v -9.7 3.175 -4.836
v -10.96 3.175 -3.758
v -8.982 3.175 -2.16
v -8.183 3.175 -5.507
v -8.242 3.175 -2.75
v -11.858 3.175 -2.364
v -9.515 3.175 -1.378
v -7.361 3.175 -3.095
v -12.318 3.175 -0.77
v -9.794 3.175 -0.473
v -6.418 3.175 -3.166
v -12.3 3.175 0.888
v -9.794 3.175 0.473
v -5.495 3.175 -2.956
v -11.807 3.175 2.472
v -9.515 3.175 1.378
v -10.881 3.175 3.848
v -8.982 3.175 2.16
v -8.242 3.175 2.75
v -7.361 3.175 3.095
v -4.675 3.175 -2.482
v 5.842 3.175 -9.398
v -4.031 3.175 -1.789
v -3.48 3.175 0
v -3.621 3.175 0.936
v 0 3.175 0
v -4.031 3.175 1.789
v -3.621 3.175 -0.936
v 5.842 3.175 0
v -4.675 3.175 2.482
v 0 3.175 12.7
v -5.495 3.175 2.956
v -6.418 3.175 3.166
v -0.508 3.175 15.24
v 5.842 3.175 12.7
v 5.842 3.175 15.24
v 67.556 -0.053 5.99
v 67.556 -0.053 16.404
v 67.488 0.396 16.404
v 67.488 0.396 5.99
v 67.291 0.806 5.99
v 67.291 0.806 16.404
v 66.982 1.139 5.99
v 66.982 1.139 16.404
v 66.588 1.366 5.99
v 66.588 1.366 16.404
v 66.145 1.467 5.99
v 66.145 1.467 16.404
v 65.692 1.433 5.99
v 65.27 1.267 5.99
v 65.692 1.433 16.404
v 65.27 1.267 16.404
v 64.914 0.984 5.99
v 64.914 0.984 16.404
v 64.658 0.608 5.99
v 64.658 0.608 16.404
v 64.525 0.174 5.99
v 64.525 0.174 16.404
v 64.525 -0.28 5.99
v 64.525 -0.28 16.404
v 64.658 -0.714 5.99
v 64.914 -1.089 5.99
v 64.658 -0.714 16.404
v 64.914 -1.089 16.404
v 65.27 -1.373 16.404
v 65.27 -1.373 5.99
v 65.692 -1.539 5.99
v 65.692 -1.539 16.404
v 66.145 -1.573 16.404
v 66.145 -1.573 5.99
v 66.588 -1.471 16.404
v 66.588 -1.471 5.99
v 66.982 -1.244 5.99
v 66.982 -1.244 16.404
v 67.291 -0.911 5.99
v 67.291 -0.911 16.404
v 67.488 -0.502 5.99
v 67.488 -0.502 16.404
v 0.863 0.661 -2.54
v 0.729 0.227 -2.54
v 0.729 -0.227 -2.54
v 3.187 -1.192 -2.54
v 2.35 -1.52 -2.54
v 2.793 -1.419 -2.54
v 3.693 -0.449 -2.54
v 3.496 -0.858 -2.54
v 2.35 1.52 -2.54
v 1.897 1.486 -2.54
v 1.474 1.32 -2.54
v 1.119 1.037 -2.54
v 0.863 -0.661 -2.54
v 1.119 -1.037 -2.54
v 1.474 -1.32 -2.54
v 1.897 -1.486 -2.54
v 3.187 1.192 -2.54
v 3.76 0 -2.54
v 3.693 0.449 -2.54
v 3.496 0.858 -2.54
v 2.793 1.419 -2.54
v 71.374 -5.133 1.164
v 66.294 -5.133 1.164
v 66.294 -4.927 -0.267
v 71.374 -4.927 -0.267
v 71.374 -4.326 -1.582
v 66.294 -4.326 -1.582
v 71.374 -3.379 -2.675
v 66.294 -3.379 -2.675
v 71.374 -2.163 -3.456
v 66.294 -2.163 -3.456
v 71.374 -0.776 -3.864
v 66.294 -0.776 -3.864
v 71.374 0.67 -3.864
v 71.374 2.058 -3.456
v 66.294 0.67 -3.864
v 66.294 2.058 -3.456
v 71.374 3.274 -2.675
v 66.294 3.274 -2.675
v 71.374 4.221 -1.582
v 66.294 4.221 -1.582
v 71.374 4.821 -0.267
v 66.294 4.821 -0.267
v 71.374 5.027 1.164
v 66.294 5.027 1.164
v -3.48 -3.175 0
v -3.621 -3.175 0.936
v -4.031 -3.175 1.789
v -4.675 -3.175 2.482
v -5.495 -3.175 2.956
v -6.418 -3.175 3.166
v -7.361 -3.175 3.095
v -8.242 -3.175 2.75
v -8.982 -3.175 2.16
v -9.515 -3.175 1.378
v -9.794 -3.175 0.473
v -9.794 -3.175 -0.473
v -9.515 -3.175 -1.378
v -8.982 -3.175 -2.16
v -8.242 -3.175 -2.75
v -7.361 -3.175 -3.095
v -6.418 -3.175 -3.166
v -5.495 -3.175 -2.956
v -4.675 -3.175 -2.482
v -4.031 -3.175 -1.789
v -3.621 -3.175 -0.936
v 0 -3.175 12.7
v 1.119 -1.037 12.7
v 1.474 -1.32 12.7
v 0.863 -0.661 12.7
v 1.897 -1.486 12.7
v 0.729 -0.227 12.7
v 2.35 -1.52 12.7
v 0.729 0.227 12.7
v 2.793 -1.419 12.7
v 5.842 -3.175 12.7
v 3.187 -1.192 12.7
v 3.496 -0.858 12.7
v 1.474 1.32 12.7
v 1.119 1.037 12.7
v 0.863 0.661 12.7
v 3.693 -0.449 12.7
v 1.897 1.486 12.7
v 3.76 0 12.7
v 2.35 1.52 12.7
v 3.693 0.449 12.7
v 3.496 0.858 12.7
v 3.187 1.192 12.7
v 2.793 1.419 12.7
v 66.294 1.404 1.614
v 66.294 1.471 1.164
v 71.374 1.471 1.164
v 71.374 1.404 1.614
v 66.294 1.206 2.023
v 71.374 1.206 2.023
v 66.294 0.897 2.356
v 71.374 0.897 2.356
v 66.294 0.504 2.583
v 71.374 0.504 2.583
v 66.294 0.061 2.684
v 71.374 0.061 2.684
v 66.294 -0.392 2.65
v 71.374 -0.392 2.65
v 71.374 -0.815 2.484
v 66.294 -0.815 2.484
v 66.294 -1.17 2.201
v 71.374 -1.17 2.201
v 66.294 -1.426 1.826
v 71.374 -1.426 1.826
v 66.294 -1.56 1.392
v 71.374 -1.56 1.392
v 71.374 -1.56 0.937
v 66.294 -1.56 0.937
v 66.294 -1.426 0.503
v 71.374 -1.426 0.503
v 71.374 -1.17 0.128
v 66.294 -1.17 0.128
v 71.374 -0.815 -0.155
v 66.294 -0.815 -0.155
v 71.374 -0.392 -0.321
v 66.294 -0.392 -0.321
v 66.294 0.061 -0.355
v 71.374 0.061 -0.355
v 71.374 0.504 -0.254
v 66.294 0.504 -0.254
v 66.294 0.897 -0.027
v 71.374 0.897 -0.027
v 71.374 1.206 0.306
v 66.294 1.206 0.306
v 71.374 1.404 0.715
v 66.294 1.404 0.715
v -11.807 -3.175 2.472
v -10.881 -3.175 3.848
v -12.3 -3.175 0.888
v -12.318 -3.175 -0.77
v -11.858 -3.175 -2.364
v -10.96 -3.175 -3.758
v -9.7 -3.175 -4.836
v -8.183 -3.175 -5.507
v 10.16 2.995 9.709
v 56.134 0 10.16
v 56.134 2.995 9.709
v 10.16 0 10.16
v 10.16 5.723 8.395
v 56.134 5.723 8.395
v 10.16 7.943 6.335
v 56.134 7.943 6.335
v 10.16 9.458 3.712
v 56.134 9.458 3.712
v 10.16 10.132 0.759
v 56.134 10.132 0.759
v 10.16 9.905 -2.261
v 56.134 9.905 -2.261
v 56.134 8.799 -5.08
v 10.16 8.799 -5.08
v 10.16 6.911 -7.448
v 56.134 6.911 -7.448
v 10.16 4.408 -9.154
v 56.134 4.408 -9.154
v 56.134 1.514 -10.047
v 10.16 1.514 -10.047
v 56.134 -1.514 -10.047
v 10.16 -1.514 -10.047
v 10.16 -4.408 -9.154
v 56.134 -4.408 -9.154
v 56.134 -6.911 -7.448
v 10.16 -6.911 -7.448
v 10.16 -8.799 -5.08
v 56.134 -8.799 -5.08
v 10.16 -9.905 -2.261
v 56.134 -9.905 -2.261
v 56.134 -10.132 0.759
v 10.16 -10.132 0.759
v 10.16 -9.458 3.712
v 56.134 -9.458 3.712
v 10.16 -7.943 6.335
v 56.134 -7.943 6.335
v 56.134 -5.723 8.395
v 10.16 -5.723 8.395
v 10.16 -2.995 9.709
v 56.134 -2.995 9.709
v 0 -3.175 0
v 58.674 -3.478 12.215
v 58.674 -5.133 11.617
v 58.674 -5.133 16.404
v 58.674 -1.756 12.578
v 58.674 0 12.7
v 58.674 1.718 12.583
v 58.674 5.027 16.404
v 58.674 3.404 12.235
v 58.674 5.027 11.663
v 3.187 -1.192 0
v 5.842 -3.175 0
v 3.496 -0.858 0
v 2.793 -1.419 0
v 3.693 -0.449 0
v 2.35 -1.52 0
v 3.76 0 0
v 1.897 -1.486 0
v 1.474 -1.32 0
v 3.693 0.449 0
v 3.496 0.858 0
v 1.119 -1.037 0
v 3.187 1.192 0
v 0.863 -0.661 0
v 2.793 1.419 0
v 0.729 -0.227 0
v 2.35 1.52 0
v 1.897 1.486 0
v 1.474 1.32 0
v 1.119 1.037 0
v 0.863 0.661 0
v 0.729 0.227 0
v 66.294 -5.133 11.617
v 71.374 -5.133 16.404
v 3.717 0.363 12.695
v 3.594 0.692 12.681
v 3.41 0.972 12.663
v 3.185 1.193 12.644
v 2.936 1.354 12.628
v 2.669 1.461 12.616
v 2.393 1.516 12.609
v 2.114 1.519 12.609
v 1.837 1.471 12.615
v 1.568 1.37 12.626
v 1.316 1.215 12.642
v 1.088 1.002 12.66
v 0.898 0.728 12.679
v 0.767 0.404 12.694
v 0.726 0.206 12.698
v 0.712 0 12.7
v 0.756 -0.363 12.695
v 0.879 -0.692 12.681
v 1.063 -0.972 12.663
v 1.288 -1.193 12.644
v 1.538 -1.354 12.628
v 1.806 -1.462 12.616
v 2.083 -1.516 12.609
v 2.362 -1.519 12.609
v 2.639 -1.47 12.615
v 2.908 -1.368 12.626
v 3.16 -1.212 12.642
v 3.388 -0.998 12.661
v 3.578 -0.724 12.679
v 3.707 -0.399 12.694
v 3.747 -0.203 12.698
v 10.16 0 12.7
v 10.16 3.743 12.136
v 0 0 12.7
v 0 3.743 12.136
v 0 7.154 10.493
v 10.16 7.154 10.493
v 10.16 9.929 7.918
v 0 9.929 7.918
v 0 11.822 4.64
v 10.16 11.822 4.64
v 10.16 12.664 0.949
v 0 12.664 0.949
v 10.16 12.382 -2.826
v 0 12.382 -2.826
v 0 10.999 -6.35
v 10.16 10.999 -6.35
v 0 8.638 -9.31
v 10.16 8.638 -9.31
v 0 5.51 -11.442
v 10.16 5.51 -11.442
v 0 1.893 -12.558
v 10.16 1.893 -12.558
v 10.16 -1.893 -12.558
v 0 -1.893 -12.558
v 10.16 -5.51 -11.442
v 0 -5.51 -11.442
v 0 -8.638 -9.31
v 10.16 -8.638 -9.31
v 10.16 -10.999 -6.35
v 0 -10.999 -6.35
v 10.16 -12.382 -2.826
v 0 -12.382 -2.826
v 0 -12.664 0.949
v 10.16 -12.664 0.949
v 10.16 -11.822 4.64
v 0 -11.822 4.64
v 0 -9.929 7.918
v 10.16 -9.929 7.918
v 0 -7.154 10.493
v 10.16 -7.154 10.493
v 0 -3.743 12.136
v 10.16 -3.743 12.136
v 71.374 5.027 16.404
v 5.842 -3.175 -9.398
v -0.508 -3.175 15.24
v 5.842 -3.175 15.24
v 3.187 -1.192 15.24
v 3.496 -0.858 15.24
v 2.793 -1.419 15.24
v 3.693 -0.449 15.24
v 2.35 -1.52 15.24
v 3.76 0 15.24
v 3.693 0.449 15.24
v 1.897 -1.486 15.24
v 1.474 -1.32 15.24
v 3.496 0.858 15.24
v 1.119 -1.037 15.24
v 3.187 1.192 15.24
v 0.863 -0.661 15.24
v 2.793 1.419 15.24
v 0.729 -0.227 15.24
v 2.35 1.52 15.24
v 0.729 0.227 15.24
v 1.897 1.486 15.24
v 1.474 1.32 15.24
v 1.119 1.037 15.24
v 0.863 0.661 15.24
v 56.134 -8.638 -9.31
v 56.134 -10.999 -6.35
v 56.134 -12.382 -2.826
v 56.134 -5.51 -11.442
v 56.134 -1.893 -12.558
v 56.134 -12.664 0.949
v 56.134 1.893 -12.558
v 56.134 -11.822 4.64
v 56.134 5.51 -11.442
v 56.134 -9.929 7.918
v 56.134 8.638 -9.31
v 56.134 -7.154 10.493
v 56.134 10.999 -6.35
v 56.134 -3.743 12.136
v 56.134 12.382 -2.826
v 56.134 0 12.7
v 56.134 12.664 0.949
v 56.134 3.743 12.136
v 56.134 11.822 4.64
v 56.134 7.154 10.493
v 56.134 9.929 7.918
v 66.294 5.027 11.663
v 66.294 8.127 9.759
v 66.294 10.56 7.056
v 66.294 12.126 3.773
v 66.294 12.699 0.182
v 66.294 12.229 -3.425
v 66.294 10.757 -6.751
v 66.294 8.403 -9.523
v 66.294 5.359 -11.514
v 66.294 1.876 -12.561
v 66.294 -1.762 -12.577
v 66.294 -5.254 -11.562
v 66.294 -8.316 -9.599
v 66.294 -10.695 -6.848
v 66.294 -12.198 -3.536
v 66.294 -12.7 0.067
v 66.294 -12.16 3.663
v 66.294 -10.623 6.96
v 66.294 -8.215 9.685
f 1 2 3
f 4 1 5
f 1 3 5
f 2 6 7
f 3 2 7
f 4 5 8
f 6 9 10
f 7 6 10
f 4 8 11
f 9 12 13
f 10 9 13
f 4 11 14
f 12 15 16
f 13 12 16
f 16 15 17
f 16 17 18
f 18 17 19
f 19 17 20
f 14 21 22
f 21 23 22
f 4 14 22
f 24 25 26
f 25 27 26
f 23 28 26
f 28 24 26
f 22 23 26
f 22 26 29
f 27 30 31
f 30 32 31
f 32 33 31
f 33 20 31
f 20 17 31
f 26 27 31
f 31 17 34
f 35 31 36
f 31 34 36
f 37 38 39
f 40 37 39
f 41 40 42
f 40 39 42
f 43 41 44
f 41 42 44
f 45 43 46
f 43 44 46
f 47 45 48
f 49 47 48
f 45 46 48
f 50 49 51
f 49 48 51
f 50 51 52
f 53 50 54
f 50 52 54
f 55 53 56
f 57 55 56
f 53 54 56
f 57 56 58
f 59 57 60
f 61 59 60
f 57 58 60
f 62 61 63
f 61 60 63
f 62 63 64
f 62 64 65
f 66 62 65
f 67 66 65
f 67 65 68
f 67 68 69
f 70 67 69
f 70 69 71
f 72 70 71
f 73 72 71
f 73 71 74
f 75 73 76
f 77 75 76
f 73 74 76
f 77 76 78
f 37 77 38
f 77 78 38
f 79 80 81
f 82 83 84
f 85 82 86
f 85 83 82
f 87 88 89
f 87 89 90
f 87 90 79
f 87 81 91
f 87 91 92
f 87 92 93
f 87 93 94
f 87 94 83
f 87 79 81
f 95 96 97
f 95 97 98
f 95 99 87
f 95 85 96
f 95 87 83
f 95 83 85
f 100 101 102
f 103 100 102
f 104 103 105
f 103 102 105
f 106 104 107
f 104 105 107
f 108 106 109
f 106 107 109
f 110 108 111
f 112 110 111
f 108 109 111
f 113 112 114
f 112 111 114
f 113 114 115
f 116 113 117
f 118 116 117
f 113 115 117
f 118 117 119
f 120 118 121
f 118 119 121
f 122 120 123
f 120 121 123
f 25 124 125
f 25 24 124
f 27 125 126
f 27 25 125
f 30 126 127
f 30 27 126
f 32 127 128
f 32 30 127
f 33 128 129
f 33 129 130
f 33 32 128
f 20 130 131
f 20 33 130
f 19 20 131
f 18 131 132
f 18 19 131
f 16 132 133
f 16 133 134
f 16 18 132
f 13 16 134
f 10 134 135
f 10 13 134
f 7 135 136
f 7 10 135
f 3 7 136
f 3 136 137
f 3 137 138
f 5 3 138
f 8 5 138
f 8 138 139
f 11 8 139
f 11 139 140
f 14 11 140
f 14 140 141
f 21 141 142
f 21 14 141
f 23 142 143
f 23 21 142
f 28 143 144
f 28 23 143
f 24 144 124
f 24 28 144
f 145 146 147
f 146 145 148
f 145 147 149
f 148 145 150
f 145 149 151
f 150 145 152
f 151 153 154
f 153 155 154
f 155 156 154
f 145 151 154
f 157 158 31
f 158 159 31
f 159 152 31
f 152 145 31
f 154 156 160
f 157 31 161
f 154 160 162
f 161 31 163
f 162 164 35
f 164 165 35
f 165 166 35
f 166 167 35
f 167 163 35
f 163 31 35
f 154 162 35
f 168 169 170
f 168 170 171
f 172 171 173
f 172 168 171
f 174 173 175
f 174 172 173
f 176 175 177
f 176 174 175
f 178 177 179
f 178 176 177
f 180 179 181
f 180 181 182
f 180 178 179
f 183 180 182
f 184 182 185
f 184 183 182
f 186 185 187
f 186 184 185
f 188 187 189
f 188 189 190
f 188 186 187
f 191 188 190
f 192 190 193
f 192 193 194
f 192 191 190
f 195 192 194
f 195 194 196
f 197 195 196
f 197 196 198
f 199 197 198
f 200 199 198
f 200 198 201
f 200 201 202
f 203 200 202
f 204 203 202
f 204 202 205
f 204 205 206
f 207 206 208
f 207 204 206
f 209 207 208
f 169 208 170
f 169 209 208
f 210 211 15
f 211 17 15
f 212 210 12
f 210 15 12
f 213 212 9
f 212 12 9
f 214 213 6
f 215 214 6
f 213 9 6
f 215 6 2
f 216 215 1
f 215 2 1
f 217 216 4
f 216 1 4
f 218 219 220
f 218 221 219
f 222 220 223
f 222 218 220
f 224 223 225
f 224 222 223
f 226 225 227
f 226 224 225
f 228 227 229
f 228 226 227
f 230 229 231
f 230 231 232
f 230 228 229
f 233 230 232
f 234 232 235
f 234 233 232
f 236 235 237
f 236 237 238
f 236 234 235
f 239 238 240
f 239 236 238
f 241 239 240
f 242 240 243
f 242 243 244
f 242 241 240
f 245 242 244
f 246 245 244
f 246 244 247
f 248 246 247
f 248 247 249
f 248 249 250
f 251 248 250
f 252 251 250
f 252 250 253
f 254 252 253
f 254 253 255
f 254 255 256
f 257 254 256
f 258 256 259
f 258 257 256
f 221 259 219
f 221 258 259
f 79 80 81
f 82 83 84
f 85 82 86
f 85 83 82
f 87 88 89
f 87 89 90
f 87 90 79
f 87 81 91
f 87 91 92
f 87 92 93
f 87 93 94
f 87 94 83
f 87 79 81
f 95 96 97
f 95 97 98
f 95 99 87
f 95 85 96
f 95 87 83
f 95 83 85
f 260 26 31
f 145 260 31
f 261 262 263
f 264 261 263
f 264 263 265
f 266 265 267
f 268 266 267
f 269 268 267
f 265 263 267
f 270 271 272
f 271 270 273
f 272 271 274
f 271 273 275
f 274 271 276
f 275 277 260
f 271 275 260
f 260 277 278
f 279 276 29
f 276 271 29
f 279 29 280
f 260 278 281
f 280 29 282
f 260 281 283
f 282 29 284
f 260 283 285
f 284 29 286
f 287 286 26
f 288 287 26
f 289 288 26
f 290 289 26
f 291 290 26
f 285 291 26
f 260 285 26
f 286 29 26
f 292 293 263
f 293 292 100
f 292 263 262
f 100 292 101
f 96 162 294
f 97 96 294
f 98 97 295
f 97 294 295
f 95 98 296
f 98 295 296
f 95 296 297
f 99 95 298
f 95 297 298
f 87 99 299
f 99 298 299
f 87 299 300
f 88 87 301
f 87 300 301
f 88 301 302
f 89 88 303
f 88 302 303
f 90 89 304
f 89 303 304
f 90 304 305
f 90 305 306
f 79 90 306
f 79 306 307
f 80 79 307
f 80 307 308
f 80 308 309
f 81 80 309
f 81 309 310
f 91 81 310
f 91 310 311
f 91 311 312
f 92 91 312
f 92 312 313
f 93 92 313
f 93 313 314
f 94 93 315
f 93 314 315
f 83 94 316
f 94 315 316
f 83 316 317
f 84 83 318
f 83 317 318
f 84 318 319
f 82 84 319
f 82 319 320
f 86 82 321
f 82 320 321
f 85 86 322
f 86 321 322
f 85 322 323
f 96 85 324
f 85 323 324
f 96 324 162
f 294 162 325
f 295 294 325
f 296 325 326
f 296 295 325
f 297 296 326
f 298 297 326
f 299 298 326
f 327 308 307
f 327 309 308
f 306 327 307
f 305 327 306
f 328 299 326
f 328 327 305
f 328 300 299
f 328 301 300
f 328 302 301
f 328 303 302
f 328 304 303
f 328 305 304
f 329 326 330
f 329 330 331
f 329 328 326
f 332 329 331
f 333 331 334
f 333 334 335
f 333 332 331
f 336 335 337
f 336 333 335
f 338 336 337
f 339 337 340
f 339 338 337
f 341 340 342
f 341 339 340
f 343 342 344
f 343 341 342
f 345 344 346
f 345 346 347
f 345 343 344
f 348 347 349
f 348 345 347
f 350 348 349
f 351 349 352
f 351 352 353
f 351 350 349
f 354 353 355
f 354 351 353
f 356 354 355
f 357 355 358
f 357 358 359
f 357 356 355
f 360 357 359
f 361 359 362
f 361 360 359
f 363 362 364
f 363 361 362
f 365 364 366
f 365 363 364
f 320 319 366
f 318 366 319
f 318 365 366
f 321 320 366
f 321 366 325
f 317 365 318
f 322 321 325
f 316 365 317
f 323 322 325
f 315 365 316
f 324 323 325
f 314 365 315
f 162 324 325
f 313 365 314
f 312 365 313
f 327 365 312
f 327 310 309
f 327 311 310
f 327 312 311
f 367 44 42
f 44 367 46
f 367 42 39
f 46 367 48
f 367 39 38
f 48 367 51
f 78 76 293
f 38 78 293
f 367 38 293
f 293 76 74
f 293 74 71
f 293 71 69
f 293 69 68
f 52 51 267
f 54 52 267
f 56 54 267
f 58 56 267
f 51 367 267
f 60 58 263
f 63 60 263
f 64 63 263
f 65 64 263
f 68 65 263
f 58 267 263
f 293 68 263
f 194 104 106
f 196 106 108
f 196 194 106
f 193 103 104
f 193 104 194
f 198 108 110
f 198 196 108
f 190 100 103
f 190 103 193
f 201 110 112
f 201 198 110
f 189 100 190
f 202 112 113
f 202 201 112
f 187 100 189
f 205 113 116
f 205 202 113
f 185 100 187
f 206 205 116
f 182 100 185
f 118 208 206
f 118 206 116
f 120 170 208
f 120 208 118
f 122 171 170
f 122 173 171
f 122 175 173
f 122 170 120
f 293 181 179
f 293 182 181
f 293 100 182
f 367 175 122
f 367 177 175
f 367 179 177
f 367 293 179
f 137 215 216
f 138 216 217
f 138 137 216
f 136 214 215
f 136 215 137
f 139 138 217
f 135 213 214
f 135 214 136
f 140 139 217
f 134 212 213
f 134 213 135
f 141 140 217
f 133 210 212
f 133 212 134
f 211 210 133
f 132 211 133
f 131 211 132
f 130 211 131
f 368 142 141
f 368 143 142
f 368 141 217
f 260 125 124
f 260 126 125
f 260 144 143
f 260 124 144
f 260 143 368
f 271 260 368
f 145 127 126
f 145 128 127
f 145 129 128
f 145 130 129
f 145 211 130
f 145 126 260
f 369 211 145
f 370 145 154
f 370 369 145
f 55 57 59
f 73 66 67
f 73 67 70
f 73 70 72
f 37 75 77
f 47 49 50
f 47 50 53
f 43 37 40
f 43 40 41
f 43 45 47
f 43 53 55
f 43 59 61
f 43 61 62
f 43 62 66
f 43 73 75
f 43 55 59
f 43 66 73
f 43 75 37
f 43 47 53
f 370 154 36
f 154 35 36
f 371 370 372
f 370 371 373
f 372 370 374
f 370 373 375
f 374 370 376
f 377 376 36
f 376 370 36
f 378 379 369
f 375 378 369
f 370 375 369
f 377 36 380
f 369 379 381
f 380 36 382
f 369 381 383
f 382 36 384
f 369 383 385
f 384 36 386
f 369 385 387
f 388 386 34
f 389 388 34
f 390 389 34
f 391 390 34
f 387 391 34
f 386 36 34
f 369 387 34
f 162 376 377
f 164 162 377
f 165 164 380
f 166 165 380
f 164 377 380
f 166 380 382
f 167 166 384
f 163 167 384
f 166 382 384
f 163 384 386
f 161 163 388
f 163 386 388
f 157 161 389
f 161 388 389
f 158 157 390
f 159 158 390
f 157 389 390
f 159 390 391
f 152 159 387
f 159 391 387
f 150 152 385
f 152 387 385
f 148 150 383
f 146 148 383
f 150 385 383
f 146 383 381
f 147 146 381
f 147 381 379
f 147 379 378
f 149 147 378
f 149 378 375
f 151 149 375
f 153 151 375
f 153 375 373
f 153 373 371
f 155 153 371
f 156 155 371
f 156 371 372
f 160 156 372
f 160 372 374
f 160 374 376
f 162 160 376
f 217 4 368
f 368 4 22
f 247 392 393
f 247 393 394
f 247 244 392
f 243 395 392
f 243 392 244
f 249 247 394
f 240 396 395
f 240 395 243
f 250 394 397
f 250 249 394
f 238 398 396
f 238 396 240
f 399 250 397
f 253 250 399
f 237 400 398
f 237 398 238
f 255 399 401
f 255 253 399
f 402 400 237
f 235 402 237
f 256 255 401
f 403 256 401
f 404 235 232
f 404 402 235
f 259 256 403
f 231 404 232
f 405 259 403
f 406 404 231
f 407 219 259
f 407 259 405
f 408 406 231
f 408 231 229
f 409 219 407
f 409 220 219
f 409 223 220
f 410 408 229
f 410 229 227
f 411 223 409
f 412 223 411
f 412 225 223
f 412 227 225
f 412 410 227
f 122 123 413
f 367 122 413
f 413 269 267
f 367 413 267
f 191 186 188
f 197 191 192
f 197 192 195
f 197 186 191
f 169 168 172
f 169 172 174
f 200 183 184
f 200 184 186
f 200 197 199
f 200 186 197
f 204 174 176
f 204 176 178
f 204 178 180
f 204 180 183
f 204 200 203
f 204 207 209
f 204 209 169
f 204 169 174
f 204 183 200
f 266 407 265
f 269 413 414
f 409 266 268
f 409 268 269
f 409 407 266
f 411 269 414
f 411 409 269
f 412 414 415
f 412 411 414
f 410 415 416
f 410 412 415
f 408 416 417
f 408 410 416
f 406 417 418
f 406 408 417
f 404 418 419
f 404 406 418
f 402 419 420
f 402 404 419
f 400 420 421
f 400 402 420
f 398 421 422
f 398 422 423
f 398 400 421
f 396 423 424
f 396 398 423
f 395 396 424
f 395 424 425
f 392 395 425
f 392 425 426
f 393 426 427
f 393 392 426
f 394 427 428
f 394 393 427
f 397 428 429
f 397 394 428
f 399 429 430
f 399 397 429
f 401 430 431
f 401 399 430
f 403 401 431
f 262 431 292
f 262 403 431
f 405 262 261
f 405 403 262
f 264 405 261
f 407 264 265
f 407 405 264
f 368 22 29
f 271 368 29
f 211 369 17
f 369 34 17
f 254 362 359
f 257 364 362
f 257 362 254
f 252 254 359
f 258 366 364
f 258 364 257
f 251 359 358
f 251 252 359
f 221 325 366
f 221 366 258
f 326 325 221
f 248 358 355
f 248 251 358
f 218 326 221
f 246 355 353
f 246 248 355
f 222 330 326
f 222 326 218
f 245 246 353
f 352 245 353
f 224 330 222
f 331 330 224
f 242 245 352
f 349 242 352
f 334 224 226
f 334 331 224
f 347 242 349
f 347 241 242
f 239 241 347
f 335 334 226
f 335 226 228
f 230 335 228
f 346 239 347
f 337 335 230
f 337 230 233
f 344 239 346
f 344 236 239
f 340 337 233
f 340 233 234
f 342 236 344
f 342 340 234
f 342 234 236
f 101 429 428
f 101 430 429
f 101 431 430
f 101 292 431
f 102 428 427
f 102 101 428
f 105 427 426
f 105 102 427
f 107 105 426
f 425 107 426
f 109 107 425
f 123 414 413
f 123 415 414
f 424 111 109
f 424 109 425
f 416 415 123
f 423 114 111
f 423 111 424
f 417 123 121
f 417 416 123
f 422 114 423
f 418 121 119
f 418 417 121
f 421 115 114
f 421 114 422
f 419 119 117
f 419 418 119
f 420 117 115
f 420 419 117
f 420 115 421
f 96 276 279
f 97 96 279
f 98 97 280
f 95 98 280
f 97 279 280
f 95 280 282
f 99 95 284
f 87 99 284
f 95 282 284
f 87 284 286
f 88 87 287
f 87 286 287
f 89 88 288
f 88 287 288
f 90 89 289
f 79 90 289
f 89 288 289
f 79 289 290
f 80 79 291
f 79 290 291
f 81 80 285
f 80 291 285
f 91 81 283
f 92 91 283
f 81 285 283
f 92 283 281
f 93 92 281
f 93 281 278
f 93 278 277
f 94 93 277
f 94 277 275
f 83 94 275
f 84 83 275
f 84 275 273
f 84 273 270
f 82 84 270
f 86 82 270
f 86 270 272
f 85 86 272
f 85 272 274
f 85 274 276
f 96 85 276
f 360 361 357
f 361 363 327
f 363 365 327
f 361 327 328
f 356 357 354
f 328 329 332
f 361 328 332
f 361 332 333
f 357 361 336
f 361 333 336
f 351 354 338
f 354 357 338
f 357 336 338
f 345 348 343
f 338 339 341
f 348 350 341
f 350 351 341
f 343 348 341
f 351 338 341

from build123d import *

# Parameters (mm, degrees)
F0_R          = 3.175
F1_DEPTH      = 3.175
F1_DEPTH_BACK = 3.175
F0_W          = 5.842
F0_H          = 12.7
F3_R          = 1.524
F4_DEPTH      = 7.62
F4_DEPTH_BACK = 5.08
F6_R          = 1.524
F7_DEPTH      = 17.78
F5_R          = 1.524
F8_DEPTH      = 10.414


with BuildPart() as f1:
    # F0 (on Front) → F1 (new body, two sides)
    with BuildSketch(Plane.XZ) as f1_sk:
        with BuildLine():
            Line((-0.9398, 0), (0, 0))
            Line((0, 0), (0, 12.7))
            Line((0, 12.7), (5.842, 12.7))
            Line((5.842, 12.7), (5.842, 15.24))
            Line((5.842, 15.24), (-0.508, 15.24))
            Line((-0.508, 15.24), (-10.8806298187, 3.8475430269))
            ThreePointArc((-10.8806298187, 3.8475430269), (-4.5919612295, 5.3297205562), (-0.9398, 0))
        make_face()
        with BuildLine():
            ThreePointArc((-8.1826630726, -5.5069827884), (-3.1957909266, -4.5493385486), (-0.9398, 0))
            ThreePointArc((-0.9398, 0), (-4.5919612295, 5.3297205562), (-10.8806298187, 3.8475430269))
            ThreePointArc((-10.8806298187, 3.8475430269), (-12.1459778134, -1.5837270034), (-8.1826630726, -5.5069827884))
        make_face()
        with Locations((-6.6548, 0)):
            Circle(F0_R, mode=Mode.SUBTRACT)
        with BuildLine():
            Line((5.842, 0), (0, 0))
            Line((0, 0), (-0.9398, 0))
            ThreePointArc((-0.9398, 0), (-3.1957909266, -4.5493385486), (-8.1826630726, -5.5069827884))
            Line((-8.1826630726, -5.5069827884), (5.842, -9.398))
            Line((5.842, -9.398), (5.842, 0))
        make_face()
    extrude(amount=-F1_DEPTH)
    extrude(f1_sk.sketch, amount=F1_DEPTH_BACK)


with BuildPart() as f2:
    # F0 (on Front) → F2 (revolve)
    with BuildSketch(Plane.XZ):
        with Locations((2.921, 6.35)):
            Rectangle(F0_W, F0_H)
        Polygon((5.842, 12.7), (5.842, 0), (66.294, 0), (66.294, 12.7), (56.134, 12.7), (56.134, 10.16), (10.16, 10.16), (10.16, 12.7), align=None)
    revolve(axis=Axis((33.147, 0, 0), (-1, 0, 0)))

    # F3 (on face) → F4 (join, two sides)
    with BuildSketch(Plane.YZ.offset(66.294)) as f4_sk:
        with BuildLine():
            ThreePointArc((-5.1327645607, 1.1644711485), (-0.0527645607, -3.9155288515), (5.0272354393, 1.1644711485))
            ThreePointArc((5.0272354393, 1.1644711485), (-0.0527645607, 6.2444711485), (-5.1327645607, 1.1644711485))
        make_face()
        with Locations((-0.0527645607, 1.1644711485)):
            Circle(F3_R, mode=Mode.SUBTRACT)
        with BuildLine():
            ThreePointArc((-5.1327645607, 11.6165712654), (-0.0575709682, 12.6998695105), (5.0272354393, 11.6626285132))
            Line((5.0272354393, 11.6626285132), (5.0272354393, 16.4044711485))
            Line((5.0272354393, 16.4044711485), (-5.1327645607, 16.4044711485))
            Line((-5.1327645607, 16.4044711485), (-5.1327645607, 11.6165712654))
        make_face()
        with BuildLine():
            ThreePointArc((-5.1327645607, 1.1644711485), (-0.0527645607, 6.2444711485), (5.0272354393, 1.1644711485))
            Line((5.0272354393, 1.1644711485), (5.0272354393, 11.6626285132))
            ThreePointArc((5.0272354393, 11.6626285132), (-0.0575709682, 12.6998695105), (-5.1327645607, 11.6165712654))
            Line((-5.1327645607, 11.6165712654), (-5.1327645607, 1.1644711485))
        make_face()
    extrude(amount=-F4_DEPTH)
    extrude(f4_sk.sketch, amount=F4_DEPTH_BACK)


with BuildPart() as f7_tool:
    # F6 (on face) → F7 (new body)
    with BuildSketch(Plane.XY.offset(15.24)):
        with Locations((2.2364268079, 0)):
            Circle(F6_R)
    extrude(amount=-F7_DEPTH)


with BuildPart() as f1_1:
    add(f1.part)

    # F7: cut by f7_tool
    add(f7_tool.part, mode=Mode.SUBTRACT)


with BuildPart() as f2_1:
    add(f2.part)

    # F7: cut by f7_tool
    add(f7_tool.part, mode=Mode.SUBTRACT)

    # F5 (on face) → F8 (cut)
    with BuildSketch(Plane.XY.offset(16.4044711485)):
        with Locations((66.0315677524, -0.0527645607)):
            Circle(F5_R)
    extrude(amount=-F8_DEPTH, mode=Mode.SUBTRACT)


solid = Compound([f1_1.part, f2_1.part])
